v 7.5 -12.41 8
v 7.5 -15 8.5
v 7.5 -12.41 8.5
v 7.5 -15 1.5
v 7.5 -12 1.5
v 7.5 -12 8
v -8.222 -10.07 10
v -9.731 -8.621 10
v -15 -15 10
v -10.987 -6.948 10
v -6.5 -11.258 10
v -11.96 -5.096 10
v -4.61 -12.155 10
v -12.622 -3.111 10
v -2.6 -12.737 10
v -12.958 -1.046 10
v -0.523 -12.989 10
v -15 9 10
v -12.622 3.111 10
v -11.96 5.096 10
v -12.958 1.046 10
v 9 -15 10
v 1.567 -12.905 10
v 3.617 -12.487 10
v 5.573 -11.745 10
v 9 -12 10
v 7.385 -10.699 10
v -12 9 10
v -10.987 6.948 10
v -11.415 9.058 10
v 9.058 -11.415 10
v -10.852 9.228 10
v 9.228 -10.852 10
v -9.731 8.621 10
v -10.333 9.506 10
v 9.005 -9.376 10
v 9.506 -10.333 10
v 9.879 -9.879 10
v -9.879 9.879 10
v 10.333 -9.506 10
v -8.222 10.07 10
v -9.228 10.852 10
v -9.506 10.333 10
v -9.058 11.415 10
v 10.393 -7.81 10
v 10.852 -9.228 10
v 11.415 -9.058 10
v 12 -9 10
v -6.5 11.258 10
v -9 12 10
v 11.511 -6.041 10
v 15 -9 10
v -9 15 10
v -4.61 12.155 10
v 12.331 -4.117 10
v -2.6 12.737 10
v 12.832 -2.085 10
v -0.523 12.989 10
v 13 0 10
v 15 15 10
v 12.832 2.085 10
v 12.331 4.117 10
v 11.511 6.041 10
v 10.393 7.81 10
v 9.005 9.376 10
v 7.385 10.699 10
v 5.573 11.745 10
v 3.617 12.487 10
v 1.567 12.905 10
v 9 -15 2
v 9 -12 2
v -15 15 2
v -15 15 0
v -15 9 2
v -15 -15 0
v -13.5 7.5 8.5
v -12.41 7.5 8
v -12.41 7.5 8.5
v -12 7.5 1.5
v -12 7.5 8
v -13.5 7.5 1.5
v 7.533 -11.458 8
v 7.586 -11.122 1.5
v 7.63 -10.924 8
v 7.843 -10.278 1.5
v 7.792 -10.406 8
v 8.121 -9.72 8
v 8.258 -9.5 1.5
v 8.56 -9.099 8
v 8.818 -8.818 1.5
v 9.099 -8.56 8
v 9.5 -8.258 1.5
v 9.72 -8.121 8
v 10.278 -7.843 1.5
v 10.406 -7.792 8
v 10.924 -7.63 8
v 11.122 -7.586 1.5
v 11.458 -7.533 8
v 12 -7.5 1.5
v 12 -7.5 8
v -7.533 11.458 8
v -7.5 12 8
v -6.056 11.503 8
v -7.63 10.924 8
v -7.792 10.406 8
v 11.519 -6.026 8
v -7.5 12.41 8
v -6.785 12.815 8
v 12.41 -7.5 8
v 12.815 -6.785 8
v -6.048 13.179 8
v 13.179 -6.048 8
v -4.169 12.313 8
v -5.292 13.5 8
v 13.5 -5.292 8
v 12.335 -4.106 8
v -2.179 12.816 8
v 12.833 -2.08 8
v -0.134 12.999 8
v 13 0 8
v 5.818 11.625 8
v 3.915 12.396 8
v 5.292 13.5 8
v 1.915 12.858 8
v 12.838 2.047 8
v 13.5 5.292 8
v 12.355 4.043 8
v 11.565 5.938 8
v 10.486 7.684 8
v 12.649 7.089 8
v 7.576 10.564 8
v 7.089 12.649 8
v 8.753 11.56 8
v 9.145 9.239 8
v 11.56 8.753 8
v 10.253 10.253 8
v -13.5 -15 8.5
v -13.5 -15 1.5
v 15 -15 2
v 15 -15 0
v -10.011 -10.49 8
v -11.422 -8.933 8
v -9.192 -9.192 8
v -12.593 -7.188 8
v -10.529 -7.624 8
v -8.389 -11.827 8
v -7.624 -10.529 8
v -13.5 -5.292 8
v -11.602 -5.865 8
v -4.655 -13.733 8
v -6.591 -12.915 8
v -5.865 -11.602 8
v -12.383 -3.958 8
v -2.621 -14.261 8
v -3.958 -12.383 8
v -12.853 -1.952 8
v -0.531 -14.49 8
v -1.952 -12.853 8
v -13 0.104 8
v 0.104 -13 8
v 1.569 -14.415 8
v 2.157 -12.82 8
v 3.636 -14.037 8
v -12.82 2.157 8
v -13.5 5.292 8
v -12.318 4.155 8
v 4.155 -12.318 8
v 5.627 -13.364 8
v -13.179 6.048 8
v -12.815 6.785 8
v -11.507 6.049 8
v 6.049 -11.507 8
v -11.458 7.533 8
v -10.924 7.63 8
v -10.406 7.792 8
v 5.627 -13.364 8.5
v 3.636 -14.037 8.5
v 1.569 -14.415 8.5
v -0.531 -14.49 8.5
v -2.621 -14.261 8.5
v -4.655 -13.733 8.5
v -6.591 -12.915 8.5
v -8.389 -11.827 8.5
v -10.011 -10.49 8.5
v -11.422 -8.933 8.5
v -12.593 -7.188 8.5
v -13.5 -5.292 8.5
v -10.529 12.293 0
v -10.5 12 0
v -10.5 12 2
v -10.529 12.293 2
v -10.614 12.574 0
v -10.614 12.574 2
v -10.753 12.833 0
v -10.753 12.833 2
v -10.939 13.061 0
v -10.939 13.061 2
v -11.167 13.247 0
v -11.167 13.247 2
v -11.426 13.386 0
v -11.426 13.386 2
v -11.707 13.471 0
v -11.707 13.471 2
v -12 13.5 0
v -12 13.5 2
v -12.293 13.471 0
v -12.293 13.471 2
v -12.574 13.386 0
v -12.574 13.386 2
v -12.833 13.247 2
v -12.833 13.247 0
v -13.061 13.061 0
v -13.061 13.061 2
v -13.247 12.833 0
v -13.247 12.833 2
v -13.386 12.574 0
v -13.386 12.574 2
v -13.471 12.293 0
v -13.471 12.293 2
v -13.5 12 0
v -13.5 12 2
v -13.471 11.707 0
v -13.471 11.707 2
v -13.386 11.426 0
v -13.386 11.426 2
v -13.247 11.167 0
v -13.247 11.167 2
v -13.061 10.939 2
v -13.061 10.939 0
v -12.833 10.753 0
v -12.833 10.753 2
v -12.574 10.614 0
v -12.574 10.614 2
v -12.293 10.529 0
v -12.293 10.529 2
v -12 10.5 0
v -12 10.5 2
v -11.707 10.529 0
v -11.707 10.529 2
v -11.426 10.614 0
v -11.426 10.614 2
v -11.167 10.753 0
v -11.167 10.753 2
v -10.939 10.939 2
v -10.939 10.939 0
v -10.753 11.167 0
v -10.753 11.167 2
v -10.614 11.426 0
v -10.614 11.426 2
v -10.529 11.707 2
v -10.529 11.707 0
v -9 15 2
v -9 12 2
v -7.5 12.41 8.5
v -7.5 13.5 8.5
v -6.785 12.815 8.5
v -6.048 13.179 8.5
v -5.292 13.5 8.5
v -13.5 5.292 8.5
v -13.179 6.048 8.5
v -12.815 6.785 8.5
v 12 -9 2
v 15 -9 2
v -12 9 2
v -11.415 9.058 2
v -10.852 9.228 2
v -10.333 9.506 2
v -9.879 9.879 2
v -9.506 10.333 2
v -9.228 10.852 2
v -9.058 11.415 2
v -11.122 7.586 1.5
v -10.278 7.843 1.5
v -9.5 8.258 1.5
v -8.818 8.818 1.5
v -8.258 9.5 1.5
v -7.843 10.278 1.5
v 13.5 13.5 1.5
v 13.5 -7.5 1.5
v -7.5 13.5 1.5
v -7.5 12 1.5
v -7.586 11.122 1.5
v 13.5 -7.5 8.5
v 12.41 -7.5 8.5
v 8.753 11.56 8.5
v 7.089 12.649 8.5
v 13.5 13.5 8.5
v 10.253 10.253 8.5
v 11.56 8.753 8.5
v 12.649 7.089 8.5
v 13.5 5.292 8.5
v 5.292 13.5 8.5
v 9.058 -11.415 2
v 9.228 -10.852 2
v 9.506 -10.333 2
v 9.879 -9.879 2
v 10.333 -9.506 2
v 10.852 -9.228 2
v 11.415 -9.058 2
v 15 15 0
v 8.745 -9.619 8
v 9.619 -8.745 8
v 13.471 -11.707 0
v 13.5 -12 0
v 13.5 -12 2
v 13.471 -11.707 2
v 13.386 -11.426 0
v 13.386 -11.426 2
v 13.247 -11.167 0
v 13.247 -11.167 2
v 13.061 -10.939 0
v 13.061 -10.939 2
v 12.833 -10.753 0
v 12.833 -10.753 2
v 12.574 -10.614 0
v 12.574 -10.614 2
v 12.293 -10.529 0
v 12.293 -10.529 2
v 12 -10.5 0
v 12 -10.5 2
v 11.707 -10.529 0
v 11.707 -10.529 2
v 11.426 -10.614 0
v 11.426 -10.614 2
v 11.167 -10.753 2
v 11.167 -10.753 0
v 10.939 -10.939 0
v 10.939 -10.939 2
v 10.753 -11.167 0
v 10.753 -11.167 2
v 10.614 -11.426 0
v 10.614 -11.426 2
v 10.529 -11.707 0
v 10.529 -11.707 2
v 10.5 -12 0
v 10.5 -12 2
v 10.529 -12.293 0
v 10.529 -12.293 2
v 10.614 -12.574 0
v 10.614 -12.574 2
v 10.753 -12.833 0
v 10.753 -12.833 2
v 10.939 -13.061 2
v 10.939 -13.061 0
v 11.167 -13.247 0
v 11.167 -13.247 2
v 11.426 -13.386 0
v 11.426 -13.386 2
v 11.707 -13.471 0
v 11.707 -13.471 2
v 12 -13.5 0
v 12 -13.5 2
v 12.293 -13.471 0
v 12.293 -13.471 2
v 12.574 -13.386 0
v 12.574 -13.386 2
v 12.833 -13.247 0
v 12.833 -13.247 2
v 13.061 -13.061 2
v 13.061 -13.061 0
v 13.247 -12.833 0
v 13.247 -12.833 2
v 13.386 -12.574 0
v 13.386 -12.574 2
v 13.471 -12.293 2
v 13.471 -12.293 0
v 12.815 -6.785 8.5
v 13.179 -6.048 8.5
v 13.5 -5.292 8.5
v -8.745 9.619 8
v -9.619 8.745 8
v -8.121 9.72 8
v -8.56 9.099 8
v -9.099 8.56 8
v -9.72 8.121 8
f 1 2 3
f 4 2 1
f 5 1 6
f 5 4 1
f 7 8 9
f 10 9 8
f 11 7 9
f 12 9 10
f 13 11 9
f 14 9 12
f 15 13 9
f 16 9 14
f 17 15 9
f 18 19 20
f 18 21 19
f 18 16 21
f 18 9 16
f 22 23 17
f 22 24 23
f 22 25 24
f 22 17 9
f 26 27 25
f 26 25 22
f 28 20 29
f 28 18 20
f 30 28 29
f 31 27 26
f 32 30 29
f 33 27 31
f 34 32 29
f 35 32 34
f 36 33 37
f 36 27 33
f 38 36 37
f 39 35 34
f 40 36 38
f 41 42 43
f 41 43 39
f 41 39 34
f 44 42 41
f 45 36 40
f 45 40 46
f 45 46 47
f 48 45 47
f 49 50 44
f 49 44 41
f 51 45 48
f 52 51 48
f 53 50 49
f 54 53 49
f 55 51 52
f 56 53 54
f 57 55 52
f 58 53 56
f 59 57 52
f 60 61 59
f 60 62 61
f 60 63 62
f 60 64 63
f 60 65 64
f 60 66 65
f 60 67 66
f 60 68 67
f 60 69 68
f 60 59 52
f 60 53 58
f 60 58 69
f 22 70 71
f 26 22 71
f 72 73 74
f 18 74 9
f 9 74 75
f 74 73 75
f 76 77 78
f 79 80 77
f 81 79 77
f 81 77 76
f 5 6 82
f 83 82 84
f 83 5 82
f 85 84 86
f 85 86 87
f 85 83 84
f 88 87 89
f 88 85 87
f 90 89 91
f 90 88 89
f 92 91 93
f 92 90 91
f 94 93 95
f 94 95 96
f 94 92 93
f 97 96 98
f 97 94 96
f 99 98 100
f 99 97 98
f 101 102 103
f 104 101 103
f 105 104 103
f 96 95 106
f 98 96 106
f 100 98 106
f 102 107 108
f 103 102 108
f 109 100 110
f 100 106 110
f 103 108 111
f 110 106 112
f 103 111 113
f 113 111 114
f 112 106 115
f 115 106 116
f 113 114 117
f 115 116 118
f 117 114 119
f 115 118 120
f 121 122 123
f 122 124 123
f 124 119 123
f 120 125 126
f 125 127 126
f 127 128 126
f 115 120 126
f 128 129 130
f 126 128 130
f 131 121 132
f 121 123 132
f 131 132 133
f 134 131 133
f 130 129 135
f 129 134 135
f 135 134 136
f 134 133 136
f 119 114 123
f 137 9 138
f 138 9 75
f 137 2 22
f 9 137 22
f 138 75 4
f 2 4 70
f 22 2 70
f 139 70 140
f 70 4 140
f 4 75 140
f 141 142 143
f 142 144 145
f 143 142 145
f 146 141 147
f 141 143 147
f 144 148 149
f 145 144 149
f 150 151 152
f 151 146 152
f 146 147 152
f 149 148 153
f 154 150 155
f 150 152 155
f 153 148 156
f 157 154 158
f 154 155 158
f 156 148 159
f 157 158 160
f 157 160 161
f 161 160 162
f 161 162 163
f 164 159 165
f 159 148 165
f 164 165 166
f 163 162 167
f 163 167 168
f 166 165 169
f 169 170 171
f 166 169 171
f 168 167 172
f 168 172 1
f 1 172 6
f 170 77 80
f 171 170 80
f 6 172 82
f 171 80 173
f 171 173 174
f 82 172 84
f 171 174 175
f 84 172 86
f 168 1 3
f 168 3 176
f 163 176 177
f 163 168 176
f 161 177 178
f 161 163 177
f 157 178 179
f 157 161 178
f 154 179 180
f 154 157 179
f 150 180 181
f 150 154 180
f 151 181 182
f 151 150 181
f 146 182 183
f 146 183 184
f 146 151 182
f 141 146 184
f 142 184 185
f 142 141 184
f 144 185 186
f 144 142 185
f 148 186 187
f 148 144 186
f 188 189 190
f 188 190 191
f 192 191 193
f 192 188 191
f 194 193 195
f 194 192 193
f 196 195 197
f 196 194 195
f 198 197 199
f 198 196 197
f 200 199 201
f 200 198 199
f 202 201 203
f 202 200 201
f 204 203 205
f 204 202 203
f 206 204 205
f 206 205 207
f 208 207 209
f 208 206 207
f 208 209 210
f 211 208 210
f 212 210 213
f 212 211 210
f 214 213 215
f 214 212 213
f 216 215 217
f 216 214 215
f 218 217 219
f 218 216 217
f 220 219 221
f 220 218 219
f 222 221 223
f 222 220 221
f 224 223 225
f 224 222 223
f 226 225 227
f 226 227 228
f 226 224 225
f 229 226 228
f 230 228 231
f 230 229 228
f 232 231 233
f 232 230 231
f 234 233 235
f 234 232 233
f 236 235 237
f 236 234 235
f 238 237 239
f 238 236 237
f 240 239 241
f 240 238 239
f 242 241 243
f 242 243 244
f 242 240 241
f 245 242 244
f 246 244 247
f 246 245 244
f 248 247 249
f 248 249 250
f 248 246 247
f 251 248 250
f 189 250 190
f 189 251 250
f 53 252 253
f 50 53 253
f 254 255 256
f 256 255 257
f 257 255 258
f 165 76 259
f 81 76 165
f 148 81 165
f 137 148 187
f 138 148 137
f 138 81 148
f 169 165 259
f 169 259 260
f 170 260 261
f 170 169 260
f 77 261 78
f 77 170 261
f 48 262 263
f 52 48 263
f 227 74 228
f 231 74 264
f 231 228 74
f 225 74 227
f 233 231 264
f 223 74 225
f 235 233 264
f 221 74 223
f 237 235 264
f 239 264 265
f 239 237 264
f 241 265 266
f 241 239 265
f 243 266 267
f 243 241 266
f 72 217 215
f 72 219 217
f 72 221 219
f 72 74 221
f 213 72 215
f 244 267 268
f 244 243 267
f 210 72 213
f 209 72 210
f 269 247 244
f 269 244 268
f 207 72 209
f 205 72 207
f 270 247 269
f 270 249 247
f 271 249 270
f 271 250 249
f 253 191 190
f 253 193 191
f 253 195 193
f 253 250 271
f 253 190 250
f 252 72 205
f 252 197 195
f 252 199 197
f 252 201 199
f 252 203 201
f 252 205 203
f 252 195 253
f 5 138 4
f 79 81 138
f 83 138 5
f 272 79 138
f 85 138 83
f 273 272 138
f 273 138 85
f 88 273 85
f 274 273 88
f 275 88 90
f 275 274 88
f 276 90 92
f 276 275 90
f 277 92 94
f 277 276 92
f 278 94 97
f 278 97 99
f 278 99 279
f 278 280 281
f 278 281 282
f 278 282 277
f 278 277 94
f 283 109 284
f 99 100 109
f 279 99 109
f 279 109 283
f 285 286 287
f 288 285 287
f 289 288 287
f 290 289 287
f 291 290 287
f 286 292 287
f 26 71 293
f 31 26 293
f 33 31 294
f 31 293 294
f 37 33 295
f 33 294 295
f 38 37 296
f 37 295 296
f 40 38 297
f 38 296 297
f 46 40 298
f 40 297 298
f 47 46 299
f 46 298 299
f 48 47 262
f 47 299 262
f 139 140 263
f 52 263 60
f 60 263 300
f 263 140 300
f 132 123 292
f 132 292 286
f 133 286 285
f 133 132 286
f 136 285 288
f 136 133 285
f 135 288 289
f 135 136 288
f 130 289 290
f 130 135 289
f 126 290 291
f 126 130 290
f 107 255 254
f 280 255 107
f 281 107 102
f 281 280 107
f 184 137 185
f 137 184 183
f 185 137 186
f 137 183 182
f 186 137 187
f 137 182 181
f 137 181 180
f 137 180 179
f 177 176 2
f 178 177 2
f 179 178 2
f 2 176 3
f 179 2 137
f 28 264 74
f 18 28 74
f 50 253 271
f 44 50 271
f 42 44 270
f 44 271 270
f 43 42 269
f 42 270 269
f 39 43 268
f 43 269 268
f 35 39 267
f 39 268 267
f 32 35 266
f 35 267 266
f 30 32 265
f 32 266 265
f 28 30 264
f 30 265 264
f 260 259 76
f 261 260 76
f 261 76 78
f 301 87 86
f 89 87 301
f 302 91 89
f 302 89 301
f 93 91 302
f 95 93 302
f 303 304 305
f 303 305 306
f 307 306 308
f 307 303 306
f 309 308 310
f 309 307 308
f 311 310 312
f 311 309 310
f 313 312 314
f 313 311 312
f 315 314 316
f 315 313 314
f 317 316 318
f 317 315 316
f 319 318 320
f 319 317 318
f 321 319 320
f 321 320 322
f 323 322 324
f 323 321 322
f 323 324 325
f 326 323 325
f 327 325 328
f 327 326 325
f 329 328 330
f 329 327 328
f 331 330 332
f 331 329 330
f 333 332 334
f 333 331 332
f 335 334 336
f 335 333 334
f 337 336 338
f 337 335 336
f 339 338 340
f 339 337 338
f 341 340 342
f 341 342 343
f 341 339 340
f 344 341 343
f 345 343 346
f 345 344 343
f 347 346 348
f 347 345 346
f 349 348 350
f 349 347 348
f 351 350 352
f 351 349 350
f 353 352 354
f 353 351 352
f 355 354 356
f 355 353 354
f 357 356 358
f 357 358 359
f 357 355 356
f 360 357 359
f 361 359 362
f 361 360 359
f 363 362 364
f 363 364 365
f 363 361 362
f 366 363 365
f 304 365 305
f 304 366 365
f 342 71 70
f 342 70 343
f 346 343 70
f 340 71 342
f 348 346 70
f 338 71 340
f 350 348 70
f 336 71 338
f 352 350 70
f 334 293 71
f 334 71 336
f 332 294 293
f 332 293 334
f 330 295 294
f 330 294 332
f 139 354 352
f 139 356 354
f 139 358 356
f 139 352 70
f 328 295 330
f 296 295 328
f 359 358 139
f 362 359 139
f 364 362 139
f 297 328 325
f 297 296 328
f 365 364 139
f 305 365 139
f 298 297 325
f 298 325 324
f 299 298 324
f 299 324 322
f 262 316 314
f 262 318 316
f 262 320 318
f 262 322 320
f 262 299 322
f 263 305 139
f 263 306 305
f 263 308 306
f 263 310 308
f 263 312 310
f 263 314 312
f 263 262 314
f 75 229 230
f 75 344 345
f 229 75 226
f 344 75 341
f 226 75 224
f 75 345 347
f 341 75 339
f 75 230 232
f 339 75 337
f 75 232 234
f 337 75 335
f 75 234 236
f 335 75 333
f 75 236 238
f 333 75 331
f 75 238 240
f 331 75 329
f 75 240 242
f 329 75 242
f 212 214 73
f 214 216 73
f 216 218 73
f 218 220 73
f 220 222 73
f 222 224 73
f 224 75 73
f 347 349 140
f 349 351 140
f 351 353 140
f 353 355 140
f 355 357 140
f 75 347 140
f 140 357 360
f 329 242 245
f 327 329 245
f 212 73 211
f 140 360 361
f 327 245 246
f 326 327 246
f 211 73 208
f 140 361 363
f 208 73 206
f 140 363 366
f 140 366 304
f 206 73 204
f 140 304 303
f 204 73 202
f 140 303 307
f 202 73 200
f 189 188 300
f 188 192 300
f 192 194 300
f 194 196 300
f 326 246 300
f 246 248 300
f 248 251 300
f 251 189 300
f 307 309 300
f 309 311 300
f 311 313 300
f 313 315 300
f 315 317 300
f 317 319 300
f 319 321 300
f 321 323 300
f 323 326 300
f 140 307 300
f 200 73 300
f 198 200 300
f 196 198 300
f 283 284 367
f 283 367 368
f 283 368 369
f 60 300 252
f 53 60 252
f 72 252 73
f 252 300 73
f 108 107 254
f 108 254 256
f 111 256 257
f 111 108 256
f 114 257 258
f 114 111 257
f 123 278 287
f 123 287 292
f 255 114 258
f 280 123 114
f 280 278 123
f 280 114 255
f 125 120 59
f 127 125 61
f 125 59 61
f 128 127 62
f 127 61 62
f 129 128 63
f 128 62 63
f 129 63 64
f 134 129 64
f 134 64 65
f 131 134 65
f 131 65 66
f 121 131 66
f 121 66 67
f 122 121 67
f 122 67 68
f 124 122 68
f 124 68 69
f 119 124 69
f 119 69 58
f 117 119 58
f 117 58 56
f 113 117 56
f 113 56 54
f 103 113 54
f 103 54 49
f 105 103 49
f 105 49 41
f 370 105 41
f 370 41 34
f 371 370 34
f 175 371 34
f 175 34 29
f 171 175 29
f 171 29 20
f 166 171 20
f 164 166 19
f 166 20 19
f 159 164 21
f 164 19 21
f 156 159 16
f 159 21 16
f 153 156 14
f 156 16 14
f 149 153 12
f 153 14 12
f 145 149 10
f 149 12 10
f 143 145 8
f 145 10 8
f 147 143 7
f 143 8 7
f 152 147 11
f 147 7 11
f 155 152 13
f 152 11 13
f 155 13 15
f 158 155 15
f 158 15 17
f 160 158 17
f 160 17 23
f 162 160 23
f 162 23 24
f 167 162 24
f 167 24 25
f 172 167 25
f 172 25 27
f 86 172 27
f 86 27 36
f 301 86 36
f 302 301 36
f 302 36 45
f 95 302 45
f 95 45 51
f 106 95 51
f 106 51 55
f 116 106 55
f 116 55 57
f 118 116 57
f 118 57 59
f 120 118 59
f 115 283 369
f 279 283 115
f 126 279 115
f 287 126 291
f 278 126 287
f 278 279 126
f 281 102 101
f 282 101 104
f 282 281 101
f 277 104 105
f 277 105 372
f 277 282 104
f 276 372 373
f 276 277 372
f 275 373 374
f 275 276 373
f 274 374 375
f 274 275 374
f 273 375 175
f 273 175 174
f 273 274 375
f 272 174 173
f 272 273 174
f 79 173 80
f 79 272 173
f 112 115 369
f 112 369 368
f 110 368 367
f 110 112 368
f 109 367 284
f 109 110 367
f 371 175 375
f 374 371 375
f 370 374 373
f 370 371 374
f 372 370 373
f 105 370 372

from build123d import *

# Parameters (mm, degrees)
RESSALTO_EXTRUS_O1_DEPTH = 10
ESBO_O1_3_R              = 1.5
RESSALTO_EXTRUS_O2_DEPTH = 2
ESBO_O2_R                = 13
CORTE_EXTRUS_O1_DEPTH    = 2
CASCA1_START             = 1.5
CASCA1_DEPTH             = 6.5
CASCA1_START_2           = 8
CASCA1_2_DEPTH           = 0.5


# Read off the part's stored shape, not the designer's step: Casca1
with BuildPart() as part:
    # Esboço1 → Ressalto-extrusão1 (new body)
    with BuildSketch(Plane.XY):
        with BuildLine():
            Line((-9, 15), (-9, 12))
            ThreePointArc((-9, 12), (-9.878679656, 9.878679656), (-12, 9))
            Line((-12, 9), (-15, 9))
            Line((-15, 9), (-15, -15))
            Line((-15, -15), (9, -15))
            Line((9, -15), (9, -12))
            ThreePointArc((9, -12), (9.878679656, -9.878679656), (12, -9))
            Line((12, -9), (15, -9))
            Line((15, -9), (15, 15))
            Line((15, 15), (-9, 15))
        make_face()
    extrude(amount=RESSALTO_EXTRUS_O1_DEPTH)

    # Esboço1<3> → Ressalto-extrusão2 (add)
    # profile 1 of 2: a face of its own
    with BuildSketch(Plane.XY):
        with BuildLine():
            ThreePointArc((-12, 9), (-9.878679656, 9.878679656), (-9, 12))
            Line((-9, 12), (-9, 15))
            Line((-9, 15), (-15, 15))
            Line((-15, 15), (-15, 9))
            Line((-15, 9), (-12, 9))
        make_face()
        with Locations((-12, 12)):
            Circle(ESBO_O1_3_R, mode=Mode.SUBTRACT)
    # profile 2 of 2: a face of its own
    with BuildSketch(Plane.XY):
        with BuildLine():
            Line((15, -15), (15, -9))
            Line((15, -9), (12, -9))
            ThreePointArc((12, -9), (9.878679656, -9.878679656), (9, -12))
            Line((9, -12), (9, -15))
            Line((9, -15), (15, -15))
        make_face()
        with Locations((12, -12)):
            Circle(ESBO_O1_3_R, mode=Mode.SUBTRACT)
    extrude(amount=RESSALTO_EXTRUS_O2_DEPTH)

    # Esboço2 → Corte-extrusão1 (cut)
    with BuildSketch(Plane.XY.offset(10)):
        Circle(ESBO_O2_R)
    extrude(amount=-CORTE_EXTRUS_O1_DEPTH, mode=Mode.SUBTRACT)

    # Casca1 outline → Casca1 (cut)
    with BuildSketch(Plane.XY.offset(CASCA1_START)):
        with BuildLine():
            Line((-13.5, -15), (7.5, -15))
            Line((7.5, -15), (7.5, -12))
            ThreePointArc((7.5, -12), (8.818019485, -8.818019485), (12, -7.5))
            Line((12, -7.5), (13.5, -7.5))
            Line((13.5, -7.5), (13.5, 13.5))
            Line((13.5, 13.5), (-7.5, 13.5))
            Line((-7.5, 13.5), (-7.5, 12))
            ThreePointArc((-7.5, 12), (-8.818019485, 8.818019485), (-12, 7.5))
            Line((-12, 7.5), (-13.5, 7.5))
            Line((-13.5, 7.5), (-13.5, -15))
        make_face()
    extrude(amount=CASCA1_DEPTH, mode=Mode.SUBTRACT)

    # Casca1 2 outline → Casca1 2 (cut)
    with BuildSketch(Plane.XY.offset(CASCA1_START_2)):
        with BuildLine():
            Line((-13.5, -5.291502622), (-13.5, -15))
            Line((-13.5, -15), (7.5, -15))
            Line((7.5, -15), (7.5, -12.409673646))
            ThreePointArc((7.5, -12.409673646), (-4.65479212, -13.732549302), (-13.5, -5.291502622))
        make_face()
        with BuildLine():
            Line((-13.5, 7.5), (-13.5, 5.291502622))
            ThreePointArc((-13.5, 5.291502622), (-13.001813807, 6.418943661), (-12.409673646, 7.5))
            Line((-12.409673646, 7.5), (-13.5, 7.5))
        make_face()
        with BuildLine():
            ThreePointArc((13.5, -5.291502622), (13.001813807, -6.418943661), (12.409673646, -7.5))
            Line((12.409673646, -7.5), (13.5, -7.5))
            Line((13.5, -7.5), (13.5, -5.291502622))
        make_face()
        with BuildLine():
            Line((-7.5, 13.5), (-7.5, 12.409673646))
            ThreePointArc((-7.5, 12.409673646), (-6.418943661, 13.001813807), (-5.291502622, 13.5))
            Line((-5.291502622, 13.5), (-7.5, 13.5))
        make_face()
        with BuildLine():
            ThreePointArc((5.291502622, 13.5), (10.253048327, 10.253048327), (13.5, 5.291502622))
            Line((13.5, 5.291502622), (13.5, 13.5))
            Line((13.5, 13.5), (5.291502622, 13.5))
        make_face()
    extrude(amount=CASCA1_2_DEPTH, mode=Mode.SUBTRACT)


solid = part.part
